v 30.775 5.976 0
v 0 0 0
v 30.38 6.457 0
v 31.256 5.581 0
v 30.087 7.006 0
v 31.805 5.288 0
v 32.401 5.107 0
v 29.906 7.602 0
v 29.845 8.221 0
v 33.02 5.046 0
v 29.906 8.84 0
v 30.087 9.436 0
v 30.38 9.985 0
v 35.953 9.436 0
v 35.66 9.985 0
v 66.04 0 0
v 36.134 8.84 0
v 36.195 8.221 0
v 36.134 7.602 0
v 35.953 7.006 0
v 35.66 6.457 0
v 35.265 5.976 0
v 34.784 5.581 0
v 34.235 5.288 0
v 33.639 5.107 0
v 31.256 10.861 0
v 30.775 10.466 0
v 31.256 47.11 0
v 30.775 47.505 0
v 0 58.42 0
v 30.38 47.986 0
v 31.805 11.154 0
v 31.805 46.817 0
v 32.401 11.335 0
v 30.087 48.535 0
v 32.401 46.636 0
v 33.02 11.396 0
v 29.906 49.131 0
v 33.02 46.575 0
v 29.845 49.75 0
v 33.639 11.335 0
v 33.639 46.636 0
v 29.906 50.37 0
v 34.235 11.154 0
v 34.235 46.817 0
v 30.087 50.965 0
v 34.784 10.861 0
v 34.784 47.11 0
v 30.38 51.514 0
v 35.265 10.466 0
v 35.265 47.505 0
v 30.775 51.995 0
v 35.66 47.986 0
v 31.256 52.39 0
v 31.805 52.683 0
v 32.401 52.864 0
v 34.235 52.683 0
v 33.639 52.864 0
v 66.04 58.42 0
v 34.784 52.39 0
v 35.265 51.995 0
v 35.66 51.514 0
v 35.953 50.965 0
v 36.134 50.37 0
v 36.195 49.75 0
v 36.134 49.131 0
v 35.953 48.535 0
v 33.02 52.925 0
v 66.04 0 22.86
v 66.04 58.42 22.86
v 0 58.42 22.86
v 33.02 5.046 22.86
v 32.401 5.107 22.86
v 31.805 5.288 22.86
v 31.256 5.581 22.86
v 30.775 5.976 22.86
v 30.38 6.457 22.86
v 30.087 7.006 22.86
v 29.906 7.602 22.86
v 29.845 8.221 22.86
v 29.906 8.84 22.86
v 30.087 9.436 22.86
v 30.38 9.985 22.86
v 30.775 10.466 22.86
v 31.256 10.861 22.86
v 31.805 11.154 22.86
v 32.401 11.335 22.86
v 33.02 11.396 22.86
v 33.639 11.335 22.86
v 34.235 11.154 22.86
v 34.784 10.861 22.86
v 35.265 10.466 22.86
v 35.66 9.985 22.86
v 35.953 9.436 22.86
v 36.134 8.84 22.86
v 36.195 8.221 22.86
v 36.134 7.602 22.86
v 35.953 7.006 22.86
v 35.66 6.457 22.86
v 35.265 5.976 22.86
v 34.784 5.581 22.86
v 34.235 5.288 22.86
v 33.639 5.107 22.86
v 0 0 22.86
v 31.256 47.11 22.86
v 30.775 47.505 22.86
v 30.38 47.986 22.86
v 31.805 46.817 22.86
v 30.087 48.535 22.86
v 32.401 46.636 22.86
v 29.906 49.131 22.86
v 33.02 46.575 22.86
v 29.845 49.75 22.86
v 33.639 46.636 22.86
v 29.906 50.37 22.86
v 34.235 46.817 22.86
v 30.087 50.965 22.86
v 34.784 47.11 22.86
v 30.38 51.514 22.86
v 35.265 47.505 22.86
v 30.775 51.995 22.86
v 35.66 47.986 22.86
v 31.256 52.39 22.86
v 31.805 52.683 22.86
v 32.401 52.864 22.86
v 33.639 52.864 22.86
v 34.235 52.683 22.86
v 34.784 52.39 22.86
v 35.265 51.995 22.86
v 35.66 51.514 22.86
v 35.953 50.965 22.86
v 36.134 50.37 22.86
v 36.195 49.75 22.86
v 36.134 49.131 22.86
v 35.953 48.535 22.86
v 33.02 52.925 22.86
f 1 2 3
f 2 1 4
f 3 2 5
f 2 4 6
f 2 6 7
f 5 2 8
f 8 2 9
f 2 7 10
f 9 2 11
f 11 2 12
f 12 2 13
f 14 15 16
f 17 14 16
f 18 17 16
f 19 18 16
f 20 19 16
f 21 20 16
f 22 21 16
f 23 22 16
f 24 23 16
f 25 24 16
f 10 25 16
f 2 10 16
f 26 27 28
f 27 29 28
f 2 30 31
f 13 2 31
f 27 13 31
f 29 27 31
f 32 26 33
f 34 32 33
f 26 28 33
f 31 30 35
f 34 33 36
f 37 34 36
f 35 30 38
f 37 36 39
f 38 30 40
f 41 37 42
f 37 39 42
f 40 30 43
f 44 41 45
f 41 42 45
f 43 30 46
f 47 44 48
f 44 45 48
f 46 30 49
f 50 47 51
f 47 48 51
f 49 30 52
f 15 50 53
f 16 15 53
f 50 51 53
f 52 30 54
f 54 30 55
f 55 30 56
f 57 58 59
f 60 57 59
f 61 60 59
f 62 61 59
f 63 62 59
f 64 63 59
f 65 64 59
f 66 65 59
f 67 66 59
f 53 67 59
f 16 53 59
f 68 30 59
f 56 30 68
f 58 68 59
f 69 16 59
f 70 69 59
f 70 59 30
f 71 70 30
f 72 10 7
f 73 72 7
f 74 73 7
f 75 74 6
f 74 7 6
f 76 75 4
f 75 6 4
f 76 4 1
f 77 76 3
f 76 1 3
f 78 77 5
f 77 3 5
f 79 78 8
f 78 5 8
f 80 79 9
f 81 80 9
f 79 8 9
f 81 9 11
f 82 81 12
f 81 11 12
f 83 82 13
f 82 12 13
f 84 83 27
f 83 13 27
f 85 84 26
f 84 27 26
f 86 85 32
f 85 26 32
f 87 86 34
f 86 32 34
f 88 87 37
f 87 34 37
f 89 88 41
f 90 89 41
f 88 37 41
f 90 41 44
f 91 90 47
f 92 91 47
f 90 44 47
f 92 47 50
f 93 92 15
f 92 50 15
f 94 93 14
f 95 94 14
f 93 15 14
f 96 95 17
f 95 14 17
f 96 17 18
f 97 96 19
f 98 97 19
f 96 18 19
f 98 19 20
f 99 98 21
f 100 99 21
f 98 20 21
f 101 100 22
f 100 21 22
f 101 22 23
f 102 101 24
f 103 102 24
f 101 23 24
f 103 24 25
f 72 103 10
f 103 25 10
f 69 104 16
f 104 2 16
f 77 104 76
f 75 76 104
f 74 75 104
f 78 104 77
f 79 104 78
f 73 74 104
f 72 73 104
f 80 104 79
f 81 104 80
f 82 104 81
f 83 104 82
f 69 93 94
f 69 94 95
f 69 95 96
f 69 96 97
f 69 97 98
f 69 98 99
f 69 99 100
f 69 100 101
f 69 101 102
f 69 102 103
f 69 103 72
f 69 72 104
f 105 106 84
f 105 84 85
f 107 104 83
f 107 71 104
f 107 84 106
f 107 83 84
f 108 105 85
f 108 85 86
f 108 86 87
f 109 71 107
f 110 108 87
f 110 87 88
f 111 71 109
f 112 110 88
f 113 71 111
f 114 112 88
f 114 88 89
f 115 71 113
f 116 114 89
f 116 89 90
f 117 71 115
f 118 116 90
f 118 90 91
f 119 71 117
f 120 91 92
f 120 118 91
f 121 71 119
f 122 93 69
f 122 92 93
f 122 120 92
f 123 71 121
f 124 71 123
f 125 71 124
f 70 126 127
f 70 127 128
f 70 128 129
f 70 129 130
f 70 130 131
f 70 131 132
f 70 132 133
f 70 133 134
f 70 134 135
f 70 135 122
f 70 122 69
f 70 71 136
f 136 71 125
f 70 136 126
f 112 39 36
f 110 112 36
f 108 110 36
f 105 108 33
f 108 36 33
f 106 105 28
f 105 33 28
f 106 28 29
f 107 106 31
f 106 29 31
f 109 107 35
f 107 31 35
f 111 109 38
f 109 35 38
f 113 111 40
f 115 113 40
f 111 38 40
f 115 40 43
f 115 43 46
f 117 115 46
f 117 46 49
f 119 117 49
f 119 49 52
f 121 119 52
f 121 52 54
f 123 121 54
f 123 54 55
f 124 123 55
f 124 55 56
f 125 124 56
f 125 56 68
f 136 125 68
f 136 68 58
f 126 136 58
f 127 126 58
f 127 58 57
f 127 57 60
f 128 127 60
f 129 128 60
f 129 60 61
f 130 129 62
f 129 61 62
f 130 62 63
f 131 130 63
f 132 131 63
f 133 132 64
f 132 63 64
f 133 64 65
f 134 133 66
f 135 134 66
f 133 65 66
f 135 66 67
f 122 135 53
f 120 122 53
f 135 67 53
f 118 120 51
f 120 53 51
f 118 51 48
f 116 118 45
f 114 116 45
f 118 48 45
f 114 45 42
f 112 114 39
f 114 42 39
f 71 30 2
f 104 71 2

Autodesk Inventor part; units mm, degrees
ref_plane "YZ Plane" through (0, 0, 0) normal (1, 0, 0) x (0, 1, 0)
ref_plane "XZ Plane" through (0, 0, 0) normal (0, 1, 0) x (-1, 0, 0)
ref_plane "XY Plane" through (0, 0, 0) normal (0, 0, 1) x (1, 0, 0)
sketch "Sketch1" plane through (0, 0, 0) normal (0, 0, 1) x (1, 0, 0)
  line L0 (0, 0) -> (66.04, 0)
  line L1 (66.04, 0) -> (66.04, 58.42)
  line L2 (66.04, 58.42) -> (0, 58.42)
  line L3 (0, 58.42) -> (0, 0)
  dimension "d0" = 66.04
  dimension "d1" = 58.42
extrude "Extrusion1" add sketch "Sketch1" along normal blind 22.86
sketch "Sketch2" plane through (0, 0, 22.86) normal (0, 0, 1) x (1, 0, 0)
  line L0 (0, 0) -> (66.04, 0) projected
  point P0 (33.02, 49.7501)
  point P1 (33.02, 8.221)
  point P2 (33.02, 0)
  point P3 (33.02, 0)
hole "Hole1" at (33.02, 49.7501, 22.86) at (33.02, 8.221, 22.86) direction (0, 0, -1) diameter 6.35 end through all
properties part number "+5V Regulator"
